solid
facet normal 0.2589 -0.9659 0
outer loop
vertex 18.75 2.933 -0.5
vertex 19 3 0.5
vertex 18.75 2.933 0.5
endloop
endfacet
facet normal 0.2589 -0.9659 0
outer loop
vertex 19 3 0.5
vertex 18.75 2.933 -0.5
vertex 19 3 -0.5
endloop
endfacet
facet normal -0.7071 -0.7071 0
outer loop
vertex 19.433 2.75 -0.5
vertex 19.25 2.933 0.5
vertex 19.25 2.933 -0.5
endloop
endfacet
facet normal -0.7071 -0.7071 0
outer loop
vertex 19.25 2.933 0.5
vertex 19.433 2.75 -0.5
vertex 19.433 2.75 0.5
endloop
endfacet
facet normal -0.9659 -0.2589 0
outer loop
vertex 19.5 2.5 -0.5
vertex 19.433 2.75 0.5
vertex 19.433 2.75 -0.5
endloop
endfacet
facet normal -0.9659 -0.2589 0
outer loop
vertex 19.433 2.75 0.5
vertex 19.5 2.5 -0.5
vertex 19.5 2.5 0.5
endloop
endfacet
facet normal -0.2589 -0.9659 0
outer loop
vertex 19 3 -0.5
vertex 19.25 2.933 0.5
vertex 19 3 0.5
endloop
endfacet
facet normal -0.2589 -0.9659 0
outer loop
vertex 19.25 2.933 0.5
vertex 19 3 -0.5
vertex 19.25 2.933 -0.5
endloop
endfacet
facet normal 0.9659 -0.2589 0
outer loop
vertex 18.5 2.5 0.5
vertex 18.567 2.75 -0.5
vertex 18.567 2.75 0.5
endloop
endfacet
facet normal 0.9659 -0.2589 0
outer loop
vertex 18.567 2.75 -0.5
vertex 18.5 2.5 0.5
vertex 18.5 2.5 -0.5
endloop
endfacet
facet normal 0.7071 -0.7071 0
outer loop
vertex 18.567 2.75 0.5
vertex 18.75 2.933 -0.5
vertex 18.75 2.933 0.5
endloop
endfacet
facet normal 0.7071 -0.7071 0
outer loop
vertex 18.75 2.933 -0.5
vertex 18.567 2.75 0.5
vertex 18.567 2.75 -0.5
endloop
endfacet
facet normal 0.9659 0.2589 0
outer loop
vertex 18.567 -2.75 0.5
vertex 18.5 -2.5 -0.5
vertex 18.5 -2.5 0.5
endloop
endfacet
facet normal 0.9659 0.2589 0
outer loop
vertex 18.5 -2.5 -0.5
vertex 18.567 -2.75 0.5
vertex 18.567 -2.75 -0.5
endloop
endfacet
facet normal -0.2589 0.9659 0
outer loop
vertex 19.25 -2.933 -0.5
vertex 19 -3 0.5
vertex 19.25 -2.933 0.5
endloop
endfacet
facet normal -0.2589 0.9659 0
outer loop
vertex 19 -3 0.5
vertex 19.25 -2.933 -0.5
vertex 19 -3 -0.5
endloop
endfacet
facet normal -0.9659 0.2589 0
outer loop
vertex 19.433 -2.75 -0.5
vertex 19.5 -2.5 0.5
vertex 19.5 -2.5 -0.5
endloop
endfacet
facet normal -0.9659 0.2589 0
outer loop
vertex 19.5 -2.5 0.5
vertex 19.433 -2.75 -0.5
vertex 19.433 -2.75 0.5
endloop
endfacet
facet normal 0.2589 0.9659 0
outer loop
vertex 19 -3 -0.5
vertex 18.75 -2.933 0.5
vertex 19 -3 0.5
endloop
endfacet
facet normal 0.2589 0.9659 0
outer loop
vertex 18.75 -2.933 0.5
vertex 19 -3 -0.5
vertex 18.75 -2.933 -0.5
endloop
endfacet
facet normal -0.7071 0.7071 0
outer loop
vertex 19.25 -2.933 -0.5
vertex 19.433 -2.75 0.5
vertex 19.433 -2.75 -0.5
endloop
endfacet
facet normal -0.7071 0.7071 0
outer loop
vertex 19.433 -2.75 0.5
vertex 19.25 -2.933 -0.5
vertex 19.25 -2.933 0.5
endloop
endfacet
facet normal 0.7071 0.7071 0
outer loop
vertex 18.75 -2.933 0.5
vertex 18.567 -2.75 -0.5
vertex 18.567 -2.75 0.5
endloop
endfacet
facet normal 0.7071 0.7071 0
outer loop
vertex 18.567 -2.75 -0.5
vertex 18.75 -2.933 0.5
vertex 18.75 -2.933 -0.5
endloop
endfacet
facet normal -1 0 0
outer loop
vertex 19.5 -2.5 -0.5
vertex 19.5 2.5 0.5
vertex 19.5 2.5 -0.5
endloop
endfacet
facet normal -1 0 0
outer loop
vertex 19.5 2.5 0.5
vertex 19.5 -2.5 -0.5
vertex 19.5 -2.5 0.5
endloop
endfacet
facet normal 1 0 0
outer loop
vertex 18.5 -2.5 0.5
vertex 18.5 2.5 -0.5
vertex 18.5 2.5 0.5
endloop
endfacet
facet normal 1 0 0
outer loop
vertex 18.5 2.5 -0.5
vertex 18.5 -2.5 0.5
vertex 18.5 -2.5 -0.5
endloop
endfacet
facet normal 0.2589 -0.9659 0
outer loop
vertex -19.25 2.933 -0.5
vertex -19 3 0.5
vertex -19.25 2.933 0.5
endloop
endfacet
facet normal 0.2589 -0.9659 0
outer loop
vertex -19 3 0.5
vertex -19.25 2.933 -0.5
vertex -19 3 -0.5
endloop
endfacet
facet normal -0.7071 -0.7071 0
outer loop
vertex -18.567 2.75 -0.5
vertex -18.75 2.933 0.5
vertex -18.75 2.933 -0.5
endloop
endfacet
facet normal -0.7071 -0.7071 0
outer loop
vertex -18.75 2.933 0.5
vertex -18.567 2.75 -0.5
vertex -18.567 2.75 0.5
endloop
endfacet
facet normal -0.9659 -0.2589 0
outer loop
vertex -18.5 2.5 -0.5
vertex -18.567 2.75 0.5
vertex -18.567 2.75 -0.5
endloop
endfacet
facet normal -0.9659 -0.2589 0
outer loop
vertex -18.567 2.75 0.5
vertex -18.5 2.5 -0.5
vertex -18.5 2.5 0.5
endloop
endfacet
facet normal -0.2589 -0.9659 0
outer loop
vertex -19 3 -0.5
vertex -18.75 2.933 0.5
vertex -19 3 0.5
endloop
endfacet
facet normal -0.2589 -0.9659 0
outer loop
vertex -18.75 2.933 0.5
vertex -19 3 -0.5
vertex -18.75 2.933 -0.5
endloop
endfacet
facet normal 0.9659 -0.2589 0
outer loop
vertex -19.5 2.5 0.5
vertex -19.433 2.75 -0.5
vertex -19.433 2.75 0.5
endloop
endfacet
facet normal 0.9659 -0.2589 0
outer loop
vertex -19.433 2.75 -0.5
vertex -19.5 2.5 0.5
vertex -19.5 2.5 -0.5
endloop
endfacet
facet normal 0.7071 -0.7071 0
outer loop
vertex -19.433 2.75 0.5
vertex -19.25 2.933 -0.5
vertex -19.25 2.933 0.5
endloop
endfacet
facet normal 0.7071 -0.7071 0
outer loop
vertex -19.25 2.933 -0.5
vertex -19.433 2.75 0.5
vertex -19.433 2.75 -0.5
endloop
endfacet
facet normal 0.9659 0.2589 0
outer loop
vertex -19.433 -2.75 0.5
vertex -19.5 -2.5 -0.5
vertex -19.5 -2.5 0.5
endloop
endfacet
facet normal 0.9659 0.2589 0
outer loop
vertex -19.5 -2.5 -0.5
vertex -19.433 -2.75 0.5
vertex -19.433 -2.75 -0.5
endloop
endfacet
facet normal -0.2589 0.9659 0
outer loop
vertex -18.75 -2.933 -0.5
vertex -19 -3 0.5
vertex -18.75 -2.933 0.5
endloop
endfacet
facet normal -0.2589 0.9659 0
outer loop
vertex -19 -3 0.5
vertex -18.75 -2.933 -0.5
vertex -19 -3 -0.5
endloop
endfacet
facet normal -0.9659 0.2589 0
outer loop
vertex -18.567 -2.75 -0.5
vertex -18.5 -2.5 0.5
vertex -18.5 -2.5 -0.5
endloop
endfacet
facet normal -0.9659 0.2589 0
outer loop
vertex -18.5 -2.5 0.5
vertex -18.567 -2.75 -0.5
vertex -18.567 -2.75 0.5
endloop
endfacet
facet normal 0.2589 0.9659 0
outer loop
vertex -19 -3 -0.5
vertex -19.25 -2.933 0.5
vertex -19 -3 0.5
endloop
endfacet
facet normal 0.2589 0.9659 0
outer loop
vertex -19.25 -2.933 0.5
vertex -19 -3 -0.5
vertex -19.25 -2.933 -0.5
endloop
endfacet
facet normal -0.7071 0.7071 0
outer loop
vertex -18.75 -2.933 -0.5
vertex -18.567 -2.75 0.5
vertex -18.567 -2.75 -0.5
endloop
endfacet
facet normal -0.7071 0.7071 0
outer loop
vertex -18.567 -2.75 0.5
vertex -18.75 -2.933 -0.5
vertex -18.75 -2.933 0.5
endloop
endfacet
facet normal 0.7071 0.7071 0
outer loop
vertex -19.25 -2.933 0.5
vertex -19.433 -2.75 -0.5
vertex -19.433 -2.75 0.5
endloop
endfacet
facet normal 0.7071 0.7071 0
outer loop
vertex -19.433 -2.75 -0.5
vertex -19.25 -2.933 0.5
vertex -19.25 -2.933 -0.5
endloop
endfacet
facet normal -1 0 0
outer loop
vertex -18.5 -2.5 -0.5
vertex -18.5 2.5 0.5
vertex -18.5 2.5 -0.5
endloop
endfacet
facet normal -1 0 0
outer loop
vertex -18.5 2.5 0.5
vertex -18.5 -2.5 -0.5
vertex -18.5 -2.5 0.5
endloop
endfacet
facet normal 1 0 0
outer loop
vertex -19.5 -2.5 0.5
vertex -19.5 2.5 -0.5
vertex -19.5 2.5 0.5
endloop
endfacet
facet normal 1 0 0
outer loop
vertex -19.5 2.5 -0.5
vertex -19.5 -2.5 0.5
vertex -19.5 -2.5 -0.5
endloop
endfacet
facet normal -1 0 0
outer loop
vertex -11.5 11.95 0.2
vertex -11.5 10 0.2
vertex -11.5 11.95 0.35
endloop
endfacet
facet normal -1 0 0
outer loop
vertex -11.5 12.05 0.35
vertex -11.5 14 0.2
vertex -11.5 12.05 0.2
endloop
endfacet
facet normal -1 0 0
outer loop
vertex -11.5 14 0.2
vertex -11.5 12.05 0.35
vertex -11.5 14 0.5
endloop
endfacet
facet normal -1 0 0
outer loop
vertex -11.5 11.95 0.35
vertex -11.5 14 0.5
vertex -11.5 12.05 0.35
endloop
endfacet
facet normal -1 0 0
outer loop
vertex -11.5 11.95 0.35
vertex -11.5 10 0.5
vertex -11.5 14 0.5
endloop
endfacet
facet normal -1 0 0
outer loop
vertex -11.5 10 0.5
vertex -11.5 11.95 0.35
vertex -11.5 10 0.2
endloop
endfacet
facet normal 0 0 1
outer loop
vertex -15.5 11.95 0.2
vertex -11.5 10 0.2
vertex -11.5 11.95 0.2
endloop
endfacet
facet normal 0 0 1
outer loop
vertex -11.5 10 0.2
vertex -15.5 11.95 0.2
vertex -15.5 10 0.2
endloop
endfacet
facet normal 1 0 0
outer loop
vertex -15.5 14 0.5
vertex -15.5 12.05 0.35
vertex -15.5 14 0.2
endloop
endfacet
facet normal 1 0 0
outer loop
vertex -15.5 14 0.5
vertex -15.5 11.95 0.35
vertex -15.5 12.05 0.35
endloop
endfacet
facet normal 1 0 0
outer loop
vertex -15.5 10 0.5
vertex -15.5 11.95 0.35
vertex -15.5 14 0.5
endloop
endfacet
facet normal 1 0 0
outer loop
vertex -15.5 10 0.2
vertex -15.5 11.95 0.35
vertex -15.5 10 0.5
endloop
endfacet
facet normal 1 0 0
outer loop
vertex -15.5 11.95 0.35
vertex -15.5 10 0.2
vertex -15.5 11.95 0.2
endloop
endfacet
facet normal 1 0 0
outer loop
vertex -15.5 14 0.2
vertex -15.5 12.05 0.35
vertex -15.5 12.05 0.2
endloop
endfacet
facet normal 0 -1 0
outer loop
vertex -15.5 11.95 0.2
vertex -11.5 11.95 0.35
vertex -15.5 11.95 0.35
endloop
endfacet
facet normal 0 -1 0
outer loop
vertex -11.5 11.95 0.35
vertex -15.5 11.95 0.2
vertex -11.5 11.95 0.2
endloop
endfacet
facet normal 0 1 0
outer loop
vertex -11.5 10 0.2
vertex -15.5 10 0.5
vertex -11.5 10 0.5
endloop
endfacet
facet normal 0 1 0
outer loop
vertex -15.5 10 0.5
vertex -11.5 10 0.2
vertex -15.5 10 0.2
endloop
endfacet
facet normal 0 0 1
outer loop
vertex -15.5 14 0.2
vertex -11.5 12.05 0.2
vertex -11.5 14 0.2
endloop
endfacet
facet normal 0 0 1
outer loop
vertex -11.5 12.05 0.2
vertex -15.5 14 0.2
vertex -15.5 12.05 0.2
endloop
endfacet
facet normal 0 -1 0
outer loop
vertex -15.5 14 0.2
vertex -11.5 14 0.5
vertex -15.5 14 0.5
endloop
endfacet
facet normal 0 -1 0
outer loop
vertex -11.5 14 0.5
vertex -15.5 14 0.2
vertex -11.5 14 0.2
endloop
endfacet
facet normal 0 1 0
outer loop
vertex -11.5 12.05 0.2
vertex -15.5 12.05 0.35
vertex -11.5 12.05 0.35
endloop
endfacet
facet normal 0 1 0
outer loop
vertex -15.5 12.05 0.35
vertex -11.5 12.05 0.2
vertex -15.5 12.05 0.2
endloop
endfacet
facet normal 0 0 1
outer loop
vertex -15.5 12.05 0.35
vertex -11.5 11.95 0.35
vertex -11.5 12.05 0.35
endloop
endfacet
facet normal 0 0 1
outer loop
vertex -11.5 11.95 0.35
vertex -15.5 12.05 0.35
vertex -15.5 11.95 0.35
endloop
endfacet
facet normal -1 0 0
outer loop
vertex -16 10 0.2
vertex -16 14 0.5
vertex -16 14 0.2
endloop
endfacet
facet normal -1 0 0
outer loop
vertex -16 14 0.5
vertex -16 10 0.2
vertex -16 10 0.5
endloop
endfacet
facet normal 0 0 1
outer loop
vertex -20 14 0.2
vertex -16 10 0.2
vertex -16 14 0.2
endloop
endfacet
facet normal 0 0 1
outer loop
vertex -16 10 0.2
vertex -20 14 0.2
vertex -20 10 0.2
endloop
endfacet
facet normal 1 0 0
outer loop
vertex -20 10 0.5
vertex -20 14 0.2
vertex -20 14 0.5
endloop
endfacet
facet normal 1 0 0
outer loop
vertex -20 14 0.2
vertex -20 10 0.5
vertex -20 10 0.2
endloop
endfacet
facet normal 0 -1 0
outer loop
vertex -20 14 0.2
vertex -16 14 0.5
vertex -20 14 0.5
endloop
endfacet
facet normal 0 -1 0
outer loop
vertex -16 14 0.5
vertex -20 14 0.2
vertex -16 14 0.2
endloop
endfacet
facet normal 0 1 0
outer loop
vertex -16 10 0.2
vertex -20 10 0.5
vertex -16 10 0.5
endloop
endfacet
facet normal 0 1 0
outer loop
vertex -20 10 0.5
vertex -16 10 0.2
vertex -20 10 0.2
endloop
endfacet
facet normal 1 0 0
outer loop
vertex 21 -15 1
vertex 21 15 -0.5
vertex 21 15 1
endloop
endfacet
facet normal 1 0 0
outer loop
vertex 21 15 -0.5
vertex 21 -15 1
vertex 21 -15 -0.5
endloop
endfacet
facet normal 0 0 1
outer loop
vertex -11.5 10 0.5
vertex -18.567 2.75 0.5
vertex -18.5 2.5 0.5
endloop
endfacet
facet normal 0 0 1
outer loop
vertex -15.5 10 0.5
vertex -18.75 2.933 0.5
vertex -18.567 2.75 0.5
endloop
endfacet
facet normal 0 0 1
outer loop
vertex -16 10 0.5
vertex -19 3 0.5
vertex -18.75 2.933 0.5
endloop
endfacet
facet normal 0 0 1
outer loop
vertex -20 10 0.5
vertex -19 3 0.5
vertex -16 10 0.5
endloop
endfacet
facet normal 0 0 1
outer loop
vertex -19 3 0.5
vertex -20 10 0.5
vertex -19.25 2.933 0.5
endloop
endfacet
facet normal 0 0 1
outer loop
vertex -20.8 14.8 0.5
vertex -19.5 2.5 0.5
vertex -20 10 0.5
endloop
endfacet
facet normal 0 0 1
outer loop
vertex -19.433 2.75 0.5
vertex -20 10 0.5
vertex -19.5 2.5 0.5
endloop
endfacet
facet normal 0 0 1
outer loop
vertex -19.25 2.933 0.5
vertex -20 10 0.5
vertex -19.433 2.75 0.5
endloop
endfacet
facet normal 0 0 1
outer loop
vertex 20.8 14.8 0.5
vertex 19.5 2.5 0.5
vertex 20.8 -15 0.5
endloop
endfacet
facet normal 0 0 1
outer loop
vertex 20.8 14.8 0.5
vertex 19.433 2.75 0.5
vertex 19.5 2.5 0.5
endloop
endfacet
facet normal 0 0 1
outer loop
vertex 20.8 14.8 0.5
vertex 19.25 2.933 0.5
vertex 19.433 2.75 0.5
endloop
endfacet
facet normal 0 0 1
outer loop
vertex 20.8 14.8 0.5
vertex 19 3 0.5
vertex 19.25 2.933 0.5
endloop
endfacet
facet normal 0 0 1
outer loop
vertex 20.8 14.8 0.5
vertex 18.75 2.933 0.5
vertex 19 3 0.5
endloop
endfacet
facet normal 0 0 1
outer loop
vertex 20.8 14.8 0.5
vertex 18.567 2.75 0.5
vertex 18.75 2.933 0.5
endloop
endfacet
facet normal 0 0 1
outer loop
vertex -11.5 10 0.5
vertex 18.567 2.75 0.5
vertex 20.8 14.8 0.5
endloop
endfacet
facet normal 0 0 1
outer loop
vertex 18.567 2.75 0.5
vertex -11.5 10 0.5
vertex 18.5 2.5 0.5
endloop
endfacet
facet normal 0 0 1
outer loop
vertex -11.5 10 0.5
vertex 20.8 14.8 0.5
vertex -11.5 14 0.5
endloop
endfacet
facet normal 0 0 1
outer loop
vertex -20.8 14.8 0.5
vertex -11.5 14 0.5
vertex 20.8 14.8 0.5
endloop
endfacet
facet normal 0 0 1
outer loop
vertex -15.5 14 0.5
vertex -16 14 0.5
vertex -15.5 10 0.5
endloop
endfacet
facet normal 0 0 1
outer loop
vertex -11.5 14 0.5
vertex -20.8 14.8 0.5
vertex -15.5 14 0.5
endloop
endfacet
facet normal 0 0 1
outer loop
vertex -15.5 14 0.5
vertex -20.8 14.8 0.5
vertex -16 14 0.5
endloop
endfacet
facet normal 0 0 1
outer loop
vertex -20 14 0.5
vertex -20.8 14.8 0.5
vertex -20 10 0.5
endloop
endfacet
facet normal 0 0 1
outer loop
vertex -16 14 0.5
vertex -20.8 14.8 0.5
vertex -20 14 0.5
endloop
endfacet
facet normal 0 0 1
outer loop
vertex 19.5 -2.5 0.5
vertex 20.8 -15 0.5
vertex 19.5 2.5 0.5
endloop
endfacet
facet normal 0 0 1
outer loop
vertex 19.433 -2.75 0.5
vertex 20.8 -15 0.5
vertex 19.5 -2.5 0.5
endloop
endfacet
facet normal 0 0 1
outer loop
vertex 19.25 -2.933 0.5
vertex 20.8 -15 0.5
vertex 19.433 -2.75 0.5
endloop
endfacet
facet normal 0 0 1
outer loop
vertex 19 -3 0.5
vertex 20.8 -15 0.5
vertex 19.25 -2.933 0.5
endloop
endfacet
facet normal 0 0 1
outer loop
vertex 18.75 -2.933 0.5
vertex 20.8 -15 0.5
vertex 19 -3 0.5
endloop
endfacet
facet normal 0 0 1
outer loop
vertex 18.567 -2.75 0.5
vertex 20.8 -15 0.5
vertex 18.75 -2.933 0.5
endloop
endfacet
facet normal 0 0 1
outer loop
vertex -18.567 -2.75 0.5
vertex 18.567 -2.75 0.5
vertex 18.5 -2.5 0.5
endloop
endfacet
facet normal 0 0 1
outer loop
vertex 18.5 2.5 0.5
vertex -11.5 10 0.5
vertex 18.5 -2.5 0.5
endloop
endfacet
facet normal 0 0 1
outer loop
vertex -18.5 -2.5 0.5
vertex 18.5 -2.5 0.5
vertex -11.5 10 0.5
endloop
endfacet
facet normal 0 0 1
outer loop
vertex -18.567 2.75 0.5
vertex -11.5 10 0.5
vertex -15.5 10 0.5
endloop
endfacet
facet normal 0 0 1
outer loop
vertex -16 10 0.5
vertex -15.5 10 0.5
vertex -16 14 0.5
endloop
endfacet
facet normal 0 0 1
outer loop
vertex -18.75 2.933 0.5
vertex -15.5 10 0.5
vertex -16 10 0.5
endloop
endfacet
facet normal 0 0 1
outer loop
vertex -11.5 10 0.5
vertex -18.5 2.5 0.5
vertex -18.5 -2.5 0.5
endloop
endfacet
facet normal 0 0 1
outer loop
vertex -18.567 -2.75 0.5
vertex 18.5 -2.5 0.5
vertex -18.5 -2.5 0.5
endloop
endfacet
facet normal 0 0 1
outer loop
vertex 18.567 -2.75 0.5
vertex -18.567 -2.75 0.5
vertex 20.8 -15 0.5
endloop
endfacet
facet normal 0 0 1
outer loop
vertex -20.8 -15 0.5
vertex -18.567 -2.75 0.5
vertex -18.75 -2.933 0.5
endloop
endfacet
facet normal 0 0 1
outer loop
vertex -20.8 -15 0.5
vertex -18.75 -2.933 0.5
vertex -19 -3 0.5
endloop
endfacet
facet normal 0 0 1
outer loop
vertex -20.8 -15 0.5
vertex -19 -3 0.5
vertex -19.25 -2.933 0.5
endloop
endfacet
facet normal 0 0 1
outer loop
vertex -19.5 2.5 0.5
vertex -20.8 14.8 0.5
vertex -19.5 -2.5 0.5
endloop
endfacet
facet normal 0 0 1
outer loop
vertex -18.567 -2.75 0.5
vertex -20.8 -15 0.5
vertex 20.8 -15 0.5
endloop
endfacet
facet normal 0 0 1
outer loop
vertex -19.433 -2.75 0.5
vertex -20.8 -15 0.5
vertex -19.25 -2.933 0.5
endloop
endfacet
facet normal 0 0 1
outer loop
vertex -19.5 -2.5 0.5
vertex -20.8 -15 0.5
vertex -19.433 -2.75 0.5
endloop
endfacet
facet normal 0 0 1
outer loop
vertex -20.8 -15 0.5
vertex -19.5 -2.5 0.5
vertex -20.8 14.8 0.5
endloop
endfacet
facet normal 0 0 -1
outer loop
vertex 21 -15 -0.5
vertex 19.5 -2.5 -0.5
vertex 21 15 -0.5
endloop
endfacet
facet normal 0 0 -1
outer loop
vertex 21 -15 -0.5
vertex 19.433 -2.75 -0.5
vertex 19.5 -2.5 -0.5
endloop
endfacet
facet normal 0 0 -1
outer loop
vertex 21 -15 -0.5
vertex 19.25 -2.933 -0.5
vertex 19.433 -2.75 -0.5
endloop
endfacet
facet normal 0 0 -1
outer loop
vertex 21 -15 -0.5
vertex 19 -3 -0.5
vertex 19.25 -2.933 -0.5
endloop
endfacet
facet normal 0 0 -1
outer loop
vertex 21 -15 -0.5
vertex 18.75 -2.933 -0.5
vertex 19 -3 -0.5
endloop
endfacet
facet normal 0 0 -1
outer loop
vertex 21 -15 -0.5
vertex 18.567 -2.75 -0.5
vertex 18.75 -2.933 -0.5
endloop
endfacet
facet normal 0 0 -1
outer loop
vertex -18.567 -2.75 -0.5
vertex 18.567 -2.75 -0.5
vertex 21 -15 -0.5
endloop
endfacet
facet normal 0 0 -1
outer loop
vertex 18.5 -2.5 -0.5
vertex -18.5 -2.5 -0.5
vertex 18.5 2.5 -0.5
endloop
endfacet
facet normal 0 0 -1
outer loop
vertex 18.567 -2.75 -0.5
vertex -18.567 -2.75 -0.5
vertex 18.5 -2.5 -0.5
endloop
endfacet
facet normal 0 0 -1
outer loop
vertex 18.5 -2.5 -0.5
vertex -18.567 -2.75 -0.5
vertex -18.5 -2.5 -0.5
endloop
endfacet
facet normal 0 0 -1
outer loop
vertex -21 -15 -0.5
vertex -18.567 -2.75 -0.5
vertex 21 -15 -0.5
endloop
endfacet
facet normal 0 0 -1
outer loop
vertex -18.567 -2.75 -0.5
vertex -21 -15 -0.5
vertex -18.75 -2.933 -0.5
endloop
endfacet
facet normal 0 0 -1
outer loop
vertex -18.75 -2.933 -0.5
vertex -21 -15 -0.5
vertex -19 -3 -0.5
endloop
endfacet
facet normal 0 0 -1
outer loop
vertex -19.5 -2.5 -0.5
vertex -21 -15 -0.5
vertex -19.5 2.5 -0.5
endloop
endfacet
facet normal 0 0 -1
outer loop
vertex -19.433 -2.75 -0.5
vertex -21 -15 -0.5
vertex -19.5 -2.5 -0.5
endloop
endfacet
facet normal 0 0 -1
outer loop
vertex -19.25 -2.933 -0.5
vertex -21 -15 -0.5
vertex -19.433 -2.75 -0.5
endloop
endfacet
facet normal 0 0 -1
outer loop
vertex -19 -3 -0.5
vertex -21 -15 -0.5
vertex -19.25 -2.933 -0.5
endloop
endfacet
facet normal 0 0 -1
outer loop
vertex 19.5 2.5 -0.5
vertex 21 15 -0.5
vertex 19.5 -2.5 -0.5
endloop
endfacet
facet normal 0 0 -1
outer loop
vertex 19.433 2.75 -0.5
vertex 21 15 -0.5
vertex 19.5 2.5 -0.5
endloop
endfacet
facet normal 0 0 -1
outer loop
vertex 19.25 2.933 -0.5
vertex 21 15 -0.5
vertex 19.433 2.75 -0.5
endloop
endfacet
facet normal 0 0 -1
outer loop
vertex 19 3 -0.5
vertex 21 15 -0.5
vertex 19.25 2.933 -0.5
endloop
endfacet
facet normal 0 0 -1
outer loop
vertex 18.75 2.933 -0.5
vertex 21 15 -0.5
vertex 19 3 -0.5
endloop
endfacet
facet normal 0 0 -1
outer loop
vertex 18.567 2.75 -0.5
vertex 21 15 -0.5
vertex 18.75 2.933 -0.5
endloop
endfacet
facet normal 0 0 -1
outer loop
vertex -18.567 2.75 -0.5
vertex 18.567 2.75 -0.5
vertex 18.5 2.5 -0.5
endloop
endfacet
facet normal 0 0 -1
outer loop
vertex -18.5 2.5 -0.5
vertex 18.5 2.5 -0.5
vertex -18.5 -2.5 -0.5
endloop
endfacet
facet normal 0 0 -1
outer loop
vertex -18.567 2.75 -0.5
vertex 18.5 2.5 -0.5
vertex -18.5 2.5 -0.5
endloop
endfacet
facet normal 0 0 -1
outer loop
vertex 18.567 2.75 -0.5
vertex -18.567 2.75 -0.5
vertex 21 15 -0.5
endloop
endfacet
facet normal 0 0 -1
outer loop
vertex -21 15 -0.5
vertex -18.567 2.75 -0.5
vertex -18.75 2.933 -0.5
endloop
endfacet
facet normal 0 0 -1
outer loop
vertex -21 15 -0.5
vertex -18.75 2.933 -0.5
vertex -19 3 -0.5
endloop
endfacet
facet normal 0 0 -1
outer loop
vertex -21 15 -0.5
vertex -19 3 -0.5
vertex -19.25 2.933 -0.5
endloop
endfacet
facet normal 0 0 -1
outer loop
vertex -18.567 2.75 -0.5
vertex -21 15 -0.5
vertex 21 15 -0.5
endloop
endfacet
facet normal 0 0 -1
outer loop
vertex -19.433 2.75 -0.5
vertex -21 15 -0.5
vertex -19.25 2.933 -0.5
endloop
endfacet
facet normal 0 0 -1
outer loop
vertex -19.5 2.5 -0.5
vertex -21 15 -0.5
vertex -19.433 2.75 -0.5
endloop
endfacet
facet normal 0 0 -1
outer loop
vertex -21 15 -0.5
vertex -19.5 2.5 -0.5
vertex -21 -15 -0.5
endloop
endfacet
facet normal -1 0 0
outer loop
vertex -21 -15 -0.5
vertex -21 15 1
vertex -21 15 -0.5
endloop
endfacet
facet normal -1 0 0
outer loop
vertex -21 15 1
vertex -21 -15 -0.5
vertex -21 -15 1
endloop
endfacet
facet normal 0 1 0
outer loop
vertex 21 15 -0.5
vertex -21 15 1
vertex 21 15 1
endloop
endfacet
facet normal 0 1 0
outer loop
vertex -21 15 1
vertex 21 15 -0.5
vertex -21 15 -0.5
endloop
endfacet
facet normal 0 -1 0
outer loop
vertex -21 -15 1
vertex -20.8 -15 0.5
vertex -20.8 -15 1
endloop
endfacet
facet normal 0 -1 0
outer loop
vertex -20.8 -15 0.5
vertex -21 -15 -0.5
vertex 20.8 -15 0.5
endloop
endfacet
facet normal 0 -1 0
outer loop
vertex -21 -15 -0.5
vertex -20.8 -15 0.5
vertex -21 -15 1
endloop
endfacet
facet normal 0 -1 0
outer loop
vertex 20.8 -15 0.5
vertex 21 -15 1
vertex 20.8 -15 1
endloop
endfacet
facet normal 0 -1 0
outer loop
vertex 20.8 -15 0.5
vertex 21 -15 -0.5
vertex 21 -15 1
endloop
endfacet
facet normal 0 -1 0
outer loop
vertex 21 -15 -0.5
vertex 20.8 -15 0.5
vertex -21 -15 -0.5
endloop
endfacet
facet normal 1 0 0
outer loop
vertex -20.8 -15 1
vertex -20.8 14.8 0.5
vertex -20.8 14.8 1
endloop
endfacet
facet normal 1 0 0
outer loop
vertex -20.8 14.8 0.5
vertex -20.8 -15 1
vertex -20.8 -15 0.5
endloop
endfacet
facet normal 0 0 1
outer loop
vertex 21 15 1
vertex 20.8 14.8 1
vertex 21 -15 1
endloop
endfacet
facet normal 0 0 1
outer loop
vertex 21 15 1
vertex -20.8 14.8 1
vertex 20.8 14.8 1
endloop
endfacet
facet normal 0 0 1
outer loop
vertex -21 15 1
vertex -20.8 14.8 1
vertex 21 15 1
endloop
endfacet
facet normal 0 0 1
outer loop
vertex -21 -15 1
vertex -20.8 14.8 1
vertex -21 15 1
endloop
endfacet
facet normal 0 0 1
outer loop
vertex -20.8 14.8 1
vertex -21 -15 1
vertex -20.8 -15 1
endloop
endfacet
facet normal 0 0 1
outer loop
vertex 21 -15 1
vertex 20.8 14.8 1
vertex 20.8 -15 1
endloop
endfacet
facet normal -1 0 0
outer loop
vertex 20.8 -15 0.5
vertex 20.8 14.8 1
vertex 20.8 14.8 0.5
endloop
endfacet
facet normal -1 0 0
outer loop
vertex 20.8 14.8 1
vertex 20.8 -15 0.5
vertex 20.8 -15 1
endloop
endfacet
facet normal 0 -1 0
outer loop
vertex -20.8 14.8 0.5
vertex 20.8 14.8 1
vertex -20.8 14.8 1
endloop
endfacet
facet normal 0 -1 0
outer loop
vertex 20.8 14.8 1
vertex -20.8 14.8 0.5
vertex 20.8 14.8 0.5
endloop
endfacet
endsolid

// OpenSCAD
//----------------------------------------------------------------------------

//use <library/sheet.scad>;

//----------------------------------------------------------------------------

width = 28 * 1.5;
height = 20 * 1.5;

//----------------------------------------------------------------------------

difference() {
  cube([width, height, 1], center = true);

  translate([ (width / 2 - 2), 0, 0])
  chwyt(d = 1, l = 6, thick = 1.01);
  translate([-(width / 2 - 2), 0, 0])
  chwyt(d = 1, l = 6, thick = 1.01);

  translate([-(width / 2 - 1), height / 2 - 4 - 1, 0.5 - 0.3]) {
    // left socket
    cube([4, 4, 0.31]);
    // right socket
    translate([(4 + 0.5), 0, 0]) {
      // top part
      cube([4, 1.95, 0.31]);
      translate([0, 2.05, 0])
      // bottom part
      cube([4, 1.95, 0.31]);
      // separator
      translate([0, 1.94, 0.15])
      cube([4, 0.12, 0.16]);
    }
  }
}

color("pink") {
  translate([-width / 2, -height / 2, 0.5])
  cube([0.2, height, 0.5]);
  translate([width / 2 - 0.2, -height / 2, 0.5])
  cube([0.2, height, 0.5]);
  translate([-width / 2, height / 2 - 0.2, 0.5])
  cube([width, 0.2, 0.5]);
}

//----------------------------------------------------------------------------

module chwyt(d = 2, l = 4, thick = 1) {
  translate([0,  (l - d) / 2, -thick / 2])
  cylinder(r = d / 2, h = thick, $fn = 12);

  translate([0, -(l - d) / 2, -thick / 2])
  cylinder(r = d / 2, h = thick, $fn = 12);

  cube([d, (l - d), thick], center = true);
}

//----------------------------------------------------------------------------
// vim:ft=openscad
